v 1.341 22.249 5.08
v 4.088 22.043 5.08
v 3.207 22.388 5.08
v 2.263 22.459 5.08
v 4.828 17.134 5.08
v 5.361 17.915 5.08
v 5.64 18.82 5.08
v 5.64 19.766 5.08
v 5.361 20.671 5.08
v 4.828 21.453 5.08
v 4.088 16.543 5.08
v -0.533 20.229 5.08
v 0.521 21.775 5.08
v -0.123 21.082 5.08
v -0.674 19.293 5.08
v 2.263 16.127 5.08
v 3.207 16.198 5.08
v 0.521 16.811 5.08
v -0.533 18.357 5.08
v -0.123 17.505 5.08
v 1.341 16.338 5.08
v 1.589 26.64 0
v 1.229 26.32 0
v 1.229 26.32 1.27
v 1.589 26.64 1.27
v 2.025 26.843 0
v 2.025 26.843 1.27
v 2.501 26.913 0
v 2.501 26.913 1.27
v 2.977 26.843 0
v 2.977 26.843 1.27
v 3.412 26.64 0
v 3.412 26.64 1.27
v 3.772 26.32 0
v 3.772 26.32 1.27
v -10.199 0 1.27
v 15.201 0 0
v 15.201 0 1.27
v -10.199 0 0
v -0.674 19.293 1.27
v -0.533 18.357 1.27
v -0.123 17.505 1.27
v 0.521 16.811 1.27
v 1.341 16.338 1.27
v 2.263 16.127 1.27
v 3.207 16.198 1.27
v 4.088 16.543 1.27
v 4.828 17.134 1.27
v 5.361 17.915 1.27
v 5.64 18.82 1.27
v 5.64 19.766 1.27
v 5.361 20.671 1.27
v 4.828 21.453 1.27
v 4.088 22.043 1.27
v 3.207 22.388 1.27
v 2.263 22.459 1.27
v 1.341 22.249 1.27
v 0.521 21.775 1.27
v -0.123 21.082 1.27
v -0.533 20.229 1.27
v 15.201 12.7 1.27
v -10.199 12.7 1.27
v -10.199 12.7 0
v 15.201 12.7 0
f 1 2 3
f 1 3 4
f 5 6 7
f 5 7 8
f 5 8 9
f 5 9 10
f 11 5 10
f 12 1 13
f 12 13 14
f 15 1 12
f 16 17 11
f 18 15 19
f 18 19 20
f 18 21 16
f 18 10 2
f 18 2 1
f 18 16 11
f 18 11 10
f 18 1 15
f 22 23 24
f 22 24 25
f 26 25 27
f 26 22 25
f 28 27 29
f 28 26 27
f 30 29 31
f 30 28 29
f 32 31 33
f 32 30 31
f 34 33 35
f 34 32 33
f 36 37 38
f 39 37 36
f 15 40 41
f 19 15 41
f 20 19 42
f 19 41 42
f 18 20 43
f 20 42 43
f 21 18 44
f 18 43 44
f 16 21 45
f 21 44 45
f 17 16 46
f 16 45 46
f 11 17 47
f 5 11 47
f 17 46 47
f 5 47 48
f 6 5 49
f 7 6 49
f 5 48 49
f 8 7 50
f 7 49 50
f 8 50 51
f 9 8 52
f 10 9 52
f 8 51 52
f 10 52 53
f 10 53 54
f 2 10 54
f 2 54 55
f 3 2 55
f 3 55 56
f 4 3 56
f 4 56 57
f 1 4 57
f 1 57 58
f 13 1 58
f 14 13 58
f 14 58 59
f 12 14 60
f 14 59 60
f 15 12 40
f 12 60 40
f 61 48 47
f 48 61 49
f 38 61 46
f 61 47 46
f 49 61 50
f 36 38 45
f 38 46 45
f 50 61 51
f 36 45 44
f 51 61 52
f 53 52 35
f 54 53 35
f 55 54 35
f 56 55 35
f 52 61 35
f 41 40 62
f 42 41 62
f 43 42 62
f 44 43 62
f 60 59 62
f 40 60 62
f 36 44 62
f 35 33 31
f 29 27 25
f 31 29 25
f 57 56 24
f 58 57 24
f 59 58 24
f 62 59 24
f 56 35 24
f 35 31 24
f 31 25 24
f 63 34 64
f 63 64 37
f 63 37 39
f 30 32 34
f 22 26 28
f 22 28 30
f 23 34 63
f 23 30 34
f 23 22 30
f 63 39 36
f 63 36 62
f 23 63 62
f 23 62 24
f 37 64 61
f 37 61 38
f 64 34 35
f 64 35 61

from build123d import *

# Parameters (mm, degrees)
BOSS_EXTRUDE2_DEPTH = 1.27
SKETCH2_R           = 3.175
BOSS_EXTRUDE4_DEPTH = 3.81


with BuildPart() as part:
    # Sketch1 → Boss-Extrude2 (new body)
    with BuildSketch(Plane.XY):
        with BuildLine():
            Line((-10.19943336, 0), (-10.19943336, 12.7))
            Line((-10.19943336, 12.7), (1.22933034, 26.320270199))
            ThreePointArc((1.22933034, 26.320270199), (2.50056664, 26.913057421), (3.77180294, 26.320270199))
            Line((3.77180294, 26.320270199), (15.20056664, 12.7))
            Line((15.20056664, 12.7), (15.20056664, 0))
            Line((15.20056664, 0), (-10.19943336, 0))
        make_face()
    extrude(amount=BOSS_EXTRUDE2_DEPTH)

    # Sketch2 → Boss-Extrude4 (add)
    with BuildSketch(Plane.XY.offset(1.27)):
        with Locations(Location((2.50056664, 19.293057421, 0), (0, 0, 180))):
            Circle(SKETCH2_R)
    extrude(amount=BOSS_EXTRUDE4_DEPTH)


solid = part.part
